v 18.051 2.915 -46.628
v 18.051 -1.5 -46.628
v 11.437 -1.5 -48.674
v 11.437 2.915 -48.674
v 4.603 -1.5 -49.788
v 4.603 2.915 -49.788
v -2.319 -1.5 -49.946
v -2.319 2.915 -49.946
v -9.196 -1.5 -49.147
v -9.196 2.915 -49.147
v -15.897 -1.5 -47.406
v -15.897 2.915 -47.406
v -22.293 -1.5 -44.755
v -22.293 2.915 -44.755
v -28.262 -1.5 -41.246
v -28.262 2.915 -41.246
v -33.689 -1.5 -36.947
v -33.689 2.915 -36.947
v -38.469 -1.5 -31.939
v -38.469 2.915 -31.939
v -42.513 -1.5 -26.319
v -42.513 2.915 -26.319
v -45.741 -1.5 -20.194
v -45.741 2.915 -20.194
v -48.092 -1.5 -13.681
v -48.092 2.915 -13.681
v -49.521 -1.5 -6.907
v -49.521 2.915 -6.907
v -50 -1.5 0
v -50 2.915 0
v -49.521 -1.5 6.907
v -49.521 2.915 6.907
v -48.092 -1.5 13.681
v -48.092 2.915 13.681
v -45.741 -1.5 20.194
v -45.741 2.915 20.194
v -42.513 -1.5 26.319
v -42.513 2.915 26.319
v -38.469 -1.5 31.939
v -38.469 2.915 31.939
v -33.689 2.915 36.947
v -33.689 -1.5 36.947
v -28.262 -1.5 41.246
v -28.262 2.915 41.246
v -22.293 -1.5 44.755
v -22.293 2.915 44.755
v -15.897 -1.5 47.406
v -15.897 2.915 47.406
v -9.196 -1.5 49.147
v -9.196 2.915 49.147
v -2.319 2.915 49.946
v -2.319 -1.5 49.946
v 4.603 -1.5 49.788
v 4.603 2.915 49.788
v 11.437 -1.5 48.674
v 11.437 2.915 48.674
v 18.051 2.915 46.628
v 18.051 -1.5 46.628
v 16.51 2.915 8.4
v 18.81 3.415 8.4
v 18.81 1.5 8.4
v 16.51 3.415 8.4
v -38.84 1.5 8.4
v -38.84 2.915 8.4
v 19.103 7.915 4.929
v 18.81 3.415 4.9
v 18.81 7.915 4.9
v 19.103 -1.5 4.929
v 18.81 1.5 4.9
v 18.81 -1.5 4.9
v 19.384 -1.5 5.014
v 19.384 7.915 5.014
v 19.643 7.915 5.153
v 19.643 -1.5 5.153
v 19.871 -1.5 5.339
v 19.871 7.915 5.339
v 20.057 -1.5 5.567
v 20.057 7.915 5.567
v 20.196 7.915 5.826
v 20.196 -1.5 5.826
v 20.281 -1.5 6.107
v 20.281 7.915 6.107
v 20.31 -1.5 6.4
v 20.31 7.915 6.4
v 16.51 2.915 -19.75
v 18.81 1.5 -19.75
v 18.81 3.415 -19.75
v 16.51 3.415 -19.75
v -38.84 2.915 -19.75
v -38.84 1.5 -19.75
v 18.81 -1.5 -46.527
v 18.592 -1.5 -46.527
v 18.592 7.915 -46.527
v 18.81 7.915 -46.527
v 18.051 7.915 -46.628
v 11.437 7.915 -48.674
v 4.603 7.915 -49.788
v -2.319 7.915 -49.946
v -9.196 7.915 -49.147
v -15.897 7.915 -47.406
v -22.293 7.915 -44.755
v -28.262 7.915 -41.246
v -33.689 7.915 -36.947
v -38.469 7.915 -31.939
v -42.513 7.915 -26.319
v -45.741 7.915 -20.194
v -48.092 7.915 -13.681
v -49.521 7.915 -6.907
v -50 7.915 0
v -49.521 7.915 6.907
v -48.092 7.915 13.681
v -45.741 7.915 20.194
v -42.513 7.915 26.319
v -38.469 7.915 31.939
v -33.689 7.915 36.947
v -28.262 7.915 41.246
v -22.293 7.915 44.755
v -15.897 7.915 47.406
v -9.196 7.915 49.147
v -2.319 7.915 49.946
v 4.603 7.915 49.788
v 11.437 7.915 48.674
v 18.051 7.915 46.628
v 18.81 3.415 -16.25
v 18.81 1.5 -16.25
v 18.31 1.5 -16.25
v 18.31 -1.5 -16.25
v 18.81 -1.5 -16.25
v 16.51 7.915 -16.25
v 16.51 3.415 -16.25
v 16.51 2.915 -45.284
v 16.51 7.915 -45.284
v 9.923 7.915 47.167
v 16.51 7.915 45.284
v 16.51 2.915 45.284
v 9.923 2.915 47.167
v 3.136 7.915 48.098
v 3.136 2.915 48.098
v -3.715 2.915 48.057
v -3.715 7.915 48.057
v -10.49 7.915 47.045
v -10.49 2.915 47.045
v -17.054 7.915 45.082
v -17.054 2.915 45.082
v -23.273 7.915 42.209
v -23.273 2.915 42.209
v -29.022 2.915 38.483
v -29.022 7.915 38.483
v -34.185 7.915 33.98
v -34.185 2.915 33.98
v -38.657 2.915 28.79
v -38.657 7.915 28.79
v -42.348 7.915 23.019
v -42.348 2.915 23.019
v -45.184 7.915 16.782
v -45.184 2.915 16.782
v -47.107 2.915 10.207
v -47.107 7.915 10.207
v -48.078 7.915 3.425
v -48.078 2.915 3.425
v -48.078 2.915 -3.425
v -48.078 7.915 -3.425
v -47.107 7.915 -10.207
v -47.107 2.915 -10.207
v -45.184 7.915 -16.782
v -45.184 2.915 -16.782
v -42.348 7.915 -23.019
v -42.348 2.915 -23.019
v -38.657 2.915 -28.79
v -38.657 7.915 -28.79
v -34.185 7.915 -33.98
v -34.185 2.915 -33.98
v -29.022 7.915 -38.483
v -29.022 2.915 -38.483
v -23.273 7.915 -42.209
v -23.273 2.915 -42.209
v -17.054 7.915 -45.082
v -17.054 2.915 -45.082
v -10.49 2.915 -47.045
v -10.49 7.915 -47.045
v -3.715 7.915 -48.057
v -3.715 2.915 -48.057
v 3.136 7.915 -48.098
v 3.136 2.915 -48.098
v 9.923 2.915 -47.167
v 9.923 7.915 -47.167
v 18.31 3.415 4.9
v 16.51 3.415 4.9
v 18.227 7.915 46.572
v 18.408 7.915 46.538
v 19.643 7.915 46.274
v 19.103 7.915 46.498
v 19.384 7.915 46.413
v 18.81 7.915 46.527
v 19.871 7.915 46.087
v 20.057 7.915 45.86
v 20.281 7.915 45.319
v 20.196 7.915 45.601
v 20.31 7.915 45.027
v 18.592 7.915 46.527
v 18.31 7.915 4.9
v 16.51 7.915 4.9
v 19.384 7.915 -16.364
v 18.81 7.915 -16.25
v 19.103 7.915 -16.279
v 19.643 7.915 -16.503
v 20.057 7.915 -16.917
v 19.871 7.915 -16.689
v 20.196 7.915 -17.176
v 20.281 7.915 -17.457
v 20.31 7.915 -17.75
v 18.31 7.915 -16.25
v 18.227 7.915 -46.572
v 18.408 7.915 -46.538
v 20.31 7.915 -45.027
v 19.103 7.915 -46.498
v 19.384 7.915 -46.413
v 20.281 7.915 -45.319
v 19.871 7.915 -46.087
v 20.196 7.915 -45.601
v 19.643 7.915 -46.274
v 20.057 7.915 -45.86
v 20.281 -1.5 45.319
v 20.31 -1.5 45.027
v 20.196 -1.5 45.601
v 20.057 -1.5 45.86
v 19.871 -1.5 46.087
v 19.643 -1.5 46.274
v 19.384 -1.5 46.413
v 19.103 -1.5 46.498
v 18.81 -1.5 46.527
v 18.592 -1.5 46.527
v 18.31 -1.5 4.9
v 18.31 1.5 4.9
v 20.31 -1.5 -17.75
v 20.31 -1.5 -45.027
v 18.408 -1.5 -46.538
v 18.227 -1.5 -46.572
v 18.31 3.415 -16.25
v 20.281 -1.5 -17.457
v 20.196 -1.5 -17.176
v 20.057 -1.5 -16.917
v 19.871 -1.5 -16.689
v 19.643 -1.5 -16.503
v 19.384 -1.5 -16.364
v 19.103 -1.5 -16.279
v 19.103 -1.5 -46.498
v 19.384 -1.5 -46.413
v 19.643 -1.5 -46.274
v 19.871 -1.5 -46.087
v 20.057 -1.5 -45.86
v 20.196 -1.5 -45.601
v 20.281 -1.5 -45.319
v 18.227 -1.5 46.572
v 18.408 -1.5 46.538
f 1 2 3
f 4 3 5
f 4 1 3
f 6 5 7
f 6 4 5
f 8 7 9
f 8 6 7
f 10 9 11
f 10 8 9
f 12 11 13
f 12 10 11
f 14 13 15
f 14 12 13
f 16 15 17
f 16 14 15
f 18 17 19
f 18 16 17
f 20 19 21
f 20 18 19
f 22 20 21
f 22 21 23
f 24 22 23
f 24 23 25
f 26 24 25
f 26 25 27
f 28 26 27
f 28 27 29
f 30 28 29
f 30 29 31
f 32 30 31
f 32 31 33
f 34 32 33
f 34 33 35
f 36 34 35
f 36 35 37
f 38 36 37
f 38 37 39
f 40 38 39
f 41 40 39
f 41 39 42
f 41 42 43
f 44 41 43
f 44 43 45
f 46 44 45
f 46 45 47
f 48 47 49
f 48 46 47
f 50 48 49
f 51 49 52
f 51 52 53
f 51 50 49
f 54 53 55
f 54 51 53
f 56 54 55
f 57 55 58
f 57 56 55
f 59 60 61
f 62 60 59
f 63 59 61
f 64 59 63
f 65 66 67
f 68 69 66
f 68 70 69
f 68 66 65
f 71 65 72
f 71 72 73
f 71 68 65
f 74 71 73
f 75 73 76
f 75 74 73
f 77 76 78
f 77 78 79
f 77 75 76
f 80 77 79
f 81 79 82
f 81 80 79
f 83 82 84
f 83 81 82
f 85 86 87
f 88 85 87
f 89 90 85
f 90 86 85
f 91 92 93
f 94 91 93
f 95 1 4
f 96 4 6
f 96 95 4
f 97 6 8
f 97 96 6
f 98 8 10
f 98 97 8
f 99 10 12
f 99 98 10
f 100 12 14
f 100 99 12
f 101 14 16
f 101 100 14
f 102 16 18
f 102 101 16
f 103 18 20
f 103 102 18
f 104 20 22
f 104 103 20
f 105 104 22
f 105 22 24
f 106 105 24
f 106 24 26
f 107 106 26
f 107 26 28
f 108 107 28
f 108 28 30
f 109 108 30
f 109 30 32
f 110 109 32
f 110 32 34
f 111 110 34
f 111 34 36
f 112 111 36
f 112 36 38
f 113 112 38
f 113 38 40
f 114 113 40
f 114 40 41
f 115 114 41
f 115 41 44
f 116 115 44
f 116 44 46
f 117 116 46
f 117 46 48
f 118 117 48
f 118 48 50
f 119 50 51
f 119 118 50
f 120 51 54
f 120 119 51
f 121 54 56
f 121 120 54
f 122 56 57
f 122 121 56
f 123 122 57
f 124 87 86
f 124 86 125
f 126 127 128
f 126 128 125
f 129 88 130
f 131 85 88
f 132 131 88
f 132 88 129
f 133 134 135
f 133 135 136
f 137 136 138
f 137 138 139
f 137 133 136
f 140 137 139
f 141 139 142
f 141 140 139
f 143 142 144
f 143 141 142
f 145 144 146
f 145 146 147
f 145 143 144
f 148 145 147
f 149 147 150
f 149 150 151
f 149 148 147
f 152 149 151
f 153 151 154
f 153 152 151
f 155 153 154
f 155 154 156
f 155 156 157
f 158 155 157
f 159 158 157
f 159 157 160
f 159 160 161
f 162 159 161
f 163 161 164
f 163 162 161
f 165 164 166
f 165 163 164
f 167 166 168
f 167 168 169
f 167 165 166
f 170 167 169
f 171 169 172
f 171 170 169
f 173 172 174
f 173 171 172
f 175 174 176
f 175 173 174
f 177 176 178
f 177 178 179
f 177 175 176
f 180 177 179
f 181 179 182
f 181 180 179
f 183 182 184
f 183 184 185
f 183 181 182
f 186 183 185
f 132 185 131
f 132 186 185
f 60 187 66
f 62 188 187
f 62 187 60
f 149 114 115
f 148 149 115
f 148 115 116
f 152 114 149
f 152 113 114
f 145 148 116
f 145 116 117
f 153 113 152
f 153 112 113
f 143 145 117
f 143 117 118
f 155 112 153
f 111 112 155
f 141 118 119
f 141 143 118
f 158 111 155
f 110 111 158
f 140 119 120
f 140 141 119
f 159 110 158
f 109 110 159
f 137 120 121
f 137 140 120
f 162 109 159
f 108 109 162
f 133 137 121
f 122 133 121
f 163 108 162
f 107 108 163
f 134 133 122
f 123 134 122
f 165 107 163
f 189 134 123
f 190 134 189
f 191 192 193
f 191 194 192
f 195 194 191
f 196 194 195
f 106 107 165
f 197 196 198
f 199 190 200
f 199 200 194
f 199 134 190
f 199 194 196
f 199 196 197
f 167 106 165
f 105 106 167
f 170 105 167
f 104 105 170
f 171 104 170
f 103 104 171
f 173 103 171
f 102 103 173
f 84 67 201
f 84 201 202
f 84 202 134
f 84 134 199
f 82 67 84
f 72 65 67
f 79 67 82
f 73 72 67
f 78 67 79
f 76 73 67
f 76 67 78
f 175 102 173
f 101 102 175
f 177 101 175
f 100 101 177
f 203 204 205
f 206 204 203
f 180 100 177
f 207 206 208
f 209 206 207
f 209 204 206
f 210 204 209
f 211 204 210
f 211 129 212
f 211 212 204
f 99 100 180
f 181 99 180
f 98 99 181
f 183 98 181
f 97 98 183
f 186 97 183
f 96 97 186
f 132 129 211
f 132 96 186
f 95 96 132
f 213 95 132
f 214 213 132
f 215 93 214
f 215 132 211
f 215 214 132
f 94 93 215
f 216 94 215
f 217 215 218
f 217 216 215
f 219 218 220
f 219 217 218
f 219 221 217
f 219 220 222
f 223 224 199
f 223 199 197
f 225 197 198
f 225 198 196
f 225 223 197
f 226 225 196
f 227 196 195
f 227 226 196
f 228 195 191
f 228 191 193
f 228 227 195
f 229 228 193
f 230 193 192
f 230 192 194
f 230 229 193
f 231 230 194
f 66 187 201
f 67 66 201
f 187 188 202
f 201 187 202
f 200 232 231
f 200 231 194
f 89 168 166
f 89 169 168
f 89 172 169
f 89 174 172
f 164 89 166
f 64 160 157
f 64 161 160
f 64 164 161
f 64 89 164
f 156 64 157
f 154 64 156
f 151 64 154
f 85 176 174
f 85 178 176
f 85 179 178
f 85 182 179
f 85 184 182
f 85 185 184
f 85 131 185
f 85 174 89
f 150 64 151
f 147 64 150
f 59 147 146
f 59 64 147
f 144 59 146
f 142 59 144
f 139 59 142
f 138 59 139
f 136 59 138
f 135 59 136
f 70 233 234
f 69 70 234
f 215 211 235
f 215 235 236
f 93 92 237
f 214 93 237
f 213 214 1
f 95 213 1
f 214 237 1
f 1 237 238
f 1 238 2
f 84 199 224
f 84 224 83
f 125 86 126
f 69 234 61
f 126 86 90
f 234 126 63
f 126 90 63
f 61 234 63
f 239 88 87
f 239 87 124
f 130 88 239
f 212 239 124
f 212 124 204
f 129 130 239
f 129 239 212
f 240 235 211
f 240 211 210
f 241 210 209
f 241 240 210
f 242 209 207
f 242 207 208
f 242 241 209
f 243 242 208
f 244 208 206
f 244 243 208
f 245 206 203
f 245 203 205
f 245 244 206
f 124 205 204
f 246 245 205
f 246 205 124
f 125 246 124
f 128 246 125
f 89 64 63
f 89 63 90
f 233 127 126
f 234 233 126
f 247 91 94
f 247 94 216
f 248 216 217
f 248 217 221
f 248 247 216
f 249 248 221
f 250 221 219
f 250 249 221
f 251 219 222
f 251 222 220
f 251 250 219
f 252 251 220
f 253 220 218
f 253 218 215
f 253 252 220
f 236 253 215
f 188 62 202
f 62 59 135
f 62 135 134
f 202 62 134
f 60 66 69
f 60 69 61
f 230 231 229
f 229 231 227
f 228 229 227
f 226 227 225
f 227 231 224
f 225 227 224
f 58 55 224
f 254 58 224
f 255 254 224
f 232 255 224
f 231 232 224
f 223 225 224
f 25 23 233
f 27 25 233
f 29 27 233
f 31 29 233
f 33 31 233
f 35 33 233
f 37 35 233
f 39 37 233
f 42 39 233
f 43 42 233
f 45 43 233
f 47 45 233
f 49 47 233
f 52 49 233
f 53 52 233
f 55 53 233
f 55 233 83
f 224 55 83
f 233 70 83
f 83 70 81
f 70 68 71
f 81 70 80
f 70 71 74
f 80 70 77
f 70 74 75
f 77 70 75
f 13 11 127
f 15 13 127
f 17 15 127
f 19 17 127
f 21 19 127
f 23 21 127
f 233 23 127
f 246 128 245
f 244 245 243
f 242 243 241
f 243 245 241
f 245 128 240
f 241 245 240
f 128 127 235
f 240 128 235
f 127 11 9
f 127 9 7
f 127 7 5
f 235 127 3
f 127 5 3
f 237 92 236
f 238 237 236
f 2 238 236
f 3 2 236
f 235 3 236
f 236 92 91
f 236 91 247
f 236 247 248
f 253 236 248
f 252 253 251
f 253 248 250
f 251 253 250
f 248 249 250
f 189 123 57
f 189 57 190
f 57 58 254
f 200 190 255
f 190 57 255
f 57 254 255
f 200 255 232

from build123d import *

# Parameters (mm, degrees)
SKETCH1_R               = 50
BOSS_EXTRUDE1_DEPTH     = 1.5
SKETCH2_R               = 50
SKETCH2_W               = 57.15
SKETCH2_H               = 28.15
BOSS_EXTRUDE2_DEPTH     = 1.415
BOSS_EXTRUDE3_START     = 5
BOSS_EXTRUDE3_DEPTH     = 5
CUT_EXTRUDE1_DEPTH      = 71.887234394
CUT_EXTRUDE1_DEPTH_BACK = 71.887234394
SKETCH6_W               = 1.8
SKETCH6_H               = 4.5
BOSS_EXTRUDE4_DEPTH     = 3.5
SKETCH7_W               = 1.8
SKETCH7_H               = 4.5
BOSS_EXTRUDE5_DEPTH     = 3.5
SKETCH8_W               = 30.276808401
SKETCH8_H               = 9.415
SKETCH8_W_2             = 41.626808401
BOSS_EXTRUDE6_DEPTH     = 2
SKETCH9_W               = 28.15
SKETCH9_H               = 1.915
CUT_EXTRUDE3_DEPTH      = 0.5
FILLET1_START           = -2
FILLET1_DEPTH           = 11
FILLET1_START_2         = -1.5
FILLET1_2_DEPTH         = 9.415


with BuildPart() as part:
    # Sketch1 → Boss-Extrude1 (new, symmetric)
    with BuildSketch(Plane(origin=(0, 0, 0), x_dir=(1, 0, 0), z_dir=(0, 1, 0))):
        with Locations(Location((0, 0, 0), (0, 0, 270))):
            Circle(SKETCH1_R)
    extrude(amount=BOSS_EXTRUDE1_DEPTH, both=True)

    # Sketch2 → Boss-Extrude2 (add, symmetric)
    with BuildSketch(Plane(origin=(0, 1.5, 0), x_dir=(1, 0, 0), z_dir=(0, 1, 0))):
        with Locations(Location((0, 0, 0), (0, 0, 270))):
            Circle(SKETCH2_R)
        with Locations((-10.265, 5.675)):
            Rectangle(SKETCH2_W, SKETCH2_H, mode=Mode.SUBTRACT)
    extrude(amount=BOSS_EXTRUDE2_DEPTH, both=True)

    # Sketch3 → Boss-Extrude3 (add)
    with BuildSketch(Plane(origin=(0, 2.915, 0), x_dir=(1, 0, 0), z_dir=(0, 1, 0)).offset(BOSS_EXTRUDE3_START)):
        with BuildLine():
            Line((16.51, 45.284212481), (16.51, 19.75))
            Line((16.51, 19.75), (18.31, 19.75))
            Line((18.31, 19.75), (18.31, 46.526808401))
            ThreePointArc((18.31, 46.526808401), (-50, 0), (18.31, -46.526808401))
            Line((18.31, -46.526808401), (18.31, -8.4))
            Line((18.31, -8.4), (16.51, -8.4))
            Line((16.51, -8.4), (16.51, -45.284212481))
            ThreePointArc((16.51, -45.284212481), (-48.2, 0), (16.51, 45.284212481))
        make_face()
    extrude(amount=-BOSS_EXTRUDE3_DEPTH)

    # Sketch4 → Cut-Extrude1 (cut, two sides: drawn at the far end of the back side and taken through both)
    with BuildSketch(Plane(origin=(0, 2.915, 0), x_dir=(1, 0, 0), z_dir=(0, 1, 0)).offset(-CUT_EXTRUDE1_DEPTH_BACK)):
        with BuildLine():
            Line((18.31, -46.526808401), (18.31, 46.526808401))
            ThreePointArc((18.31, 46.526808401), (50, 0), (18.31, -46.526808401))
        make_face()
    extrude(amount=CUT_EXTRUDE1_DEPTH + CUT_EXTRUDE1_DEPTH_BACK, mode=Mode.SUBTRACT)

    # Sketch6 → Boss-Extrude4 (add)
    with BuildSketch(Plane.XY.offset(-19.75)):
        with Locations((17.41, 5.665)):
            Rectangle(SKETCH6_W, SKETCH6_H)
    extrude(amount=BOSS_EXTRUDE4_DEPTH)

    # Sketch7 → Boss-Extrude5 (add)
    with BuildSketch(Plane(origin=(0, 0, 8.4), x_dir=(-1, 0, 0), z_dir=(0, 0, -1))):
        with Locations((-17.41, 5.665)):
            Rectangle(SKETCH7_W, SKETCH7_H)
    extrude(amount=BOSS_EXTRUDE5_DEPTH)

    # Sketch8 → Boss-Extrude6 (add)
    with BuildSketch(Plane(origin=(18.31, 0, 0), x_dir=(0, 0, -1), z_dir=(1, 0, 0))):
        with Locations((31.388404201, 3.2075)):
            Rectangle(SKETCH8_W, SKETCH8_H)
        with Locations((-25.713404201, 3.2075)):
            Rectangle(SKETCH8_W_2, SKETCH8_H)
    extrude(amount=BOSS_EXTRUDE6_DEPTH)

    # Sketch9 → Cut-Extrude3 (cut)
    with BuildSketch(Plane.ZY.offset(-18.31)):
        with Locations((-5.675, 2.4575)):
            Rectangle(SKETCH9_W, SKETCH9_H)
    extrude(amount=-CUT_EXTRUDE3_DEPTH, mode=Mode.SUBTRACT)

    # Fillet1: read off the stored shape, not the designer's step
    # Fillet1 outline → Fillet1 (cut)
    with BuildSketch(Plane(origin=(0, 0, 0), x_dir=(1, 0, 0), z_dir=(0, 1, 0)).offset(FILLET1_START)):
        with BuildLine():
            Line((20.31, -4.9), (18.81, -4.9))
            ThreePointArc((18.81, -4.9), (19.870660172, -5.339339828), (20.31, -6.4))
            Line((20.31, -6.4), (20.31, -4.9))
        make_face()
        with BuildLine():
            Line((20.31, 16.25), (20.31, 17.75))
            ThreePointArc((20.31, 17.75), (19.870660172, 16.689339828), (18.81, 16.25))
            Line((18.81, 16.25), (20.31, 16.25))
        make_face()
        with BuildLine():
            Line((20.31, 46.526808401), (18.81, 46.526808401))
            ThreePointArc((18.81, 46.526808401), (19.870660172, 46.087468573), (20.31, 45.026808401))
            Line((20.31, 45.026808401), (20.31, 46.526808401))
        make_face()
        with BuildLine():
            Line((20.31, -46.526808401), (20.31, -45.026808401))
            ThreePointArc((20.31, -45.026808401), (19.870660172, -46.087468573), (18.81, -46.526808401))
            Line((18.81, -46.526808401), (20.31, -46.526808401))
        make_face()
    extrude(amount=FILLET1_DEPTH, mode=Mode.SUBTRACT)

    # Fillet1 2 outline → Fillet1 2 (add)
    with BuildSketch(Plane(origin=(0, 0, 0), x_dir=(1, 0, 0), z_dir=(0, 1, 0)).offset(FILLET1_START_2)):
        with BuildLine():
            ThreePointArc((18.592355278, 46.526808401), (18.316908931, 46.552315502), (18.050830367, 46.627969322))
            ThreePointArc((18.050830367, 46.627969322), (18.180485544, 46.577569122), (18.31, 46.526808401))
            Line((18.31, 46.526808401), (18.592355278, 46.526808401))
        make_face()
        with BuildLine():
            ThreePointArc((18.050830367, -46.627969322), (18.316908931, -46.552315502), (18.592355278, -46.526808401))
            Line((18.592355278, -46.526808401), (18.31, -46.526808401))
            ThreePointArc((18.31, -46.526808401), (18.180485544, -46.577569122), (18.050830367, -46.627969322))
        make_face()
    extrude(amount=FILLET1_2_DEPTH)


solid = part.part
